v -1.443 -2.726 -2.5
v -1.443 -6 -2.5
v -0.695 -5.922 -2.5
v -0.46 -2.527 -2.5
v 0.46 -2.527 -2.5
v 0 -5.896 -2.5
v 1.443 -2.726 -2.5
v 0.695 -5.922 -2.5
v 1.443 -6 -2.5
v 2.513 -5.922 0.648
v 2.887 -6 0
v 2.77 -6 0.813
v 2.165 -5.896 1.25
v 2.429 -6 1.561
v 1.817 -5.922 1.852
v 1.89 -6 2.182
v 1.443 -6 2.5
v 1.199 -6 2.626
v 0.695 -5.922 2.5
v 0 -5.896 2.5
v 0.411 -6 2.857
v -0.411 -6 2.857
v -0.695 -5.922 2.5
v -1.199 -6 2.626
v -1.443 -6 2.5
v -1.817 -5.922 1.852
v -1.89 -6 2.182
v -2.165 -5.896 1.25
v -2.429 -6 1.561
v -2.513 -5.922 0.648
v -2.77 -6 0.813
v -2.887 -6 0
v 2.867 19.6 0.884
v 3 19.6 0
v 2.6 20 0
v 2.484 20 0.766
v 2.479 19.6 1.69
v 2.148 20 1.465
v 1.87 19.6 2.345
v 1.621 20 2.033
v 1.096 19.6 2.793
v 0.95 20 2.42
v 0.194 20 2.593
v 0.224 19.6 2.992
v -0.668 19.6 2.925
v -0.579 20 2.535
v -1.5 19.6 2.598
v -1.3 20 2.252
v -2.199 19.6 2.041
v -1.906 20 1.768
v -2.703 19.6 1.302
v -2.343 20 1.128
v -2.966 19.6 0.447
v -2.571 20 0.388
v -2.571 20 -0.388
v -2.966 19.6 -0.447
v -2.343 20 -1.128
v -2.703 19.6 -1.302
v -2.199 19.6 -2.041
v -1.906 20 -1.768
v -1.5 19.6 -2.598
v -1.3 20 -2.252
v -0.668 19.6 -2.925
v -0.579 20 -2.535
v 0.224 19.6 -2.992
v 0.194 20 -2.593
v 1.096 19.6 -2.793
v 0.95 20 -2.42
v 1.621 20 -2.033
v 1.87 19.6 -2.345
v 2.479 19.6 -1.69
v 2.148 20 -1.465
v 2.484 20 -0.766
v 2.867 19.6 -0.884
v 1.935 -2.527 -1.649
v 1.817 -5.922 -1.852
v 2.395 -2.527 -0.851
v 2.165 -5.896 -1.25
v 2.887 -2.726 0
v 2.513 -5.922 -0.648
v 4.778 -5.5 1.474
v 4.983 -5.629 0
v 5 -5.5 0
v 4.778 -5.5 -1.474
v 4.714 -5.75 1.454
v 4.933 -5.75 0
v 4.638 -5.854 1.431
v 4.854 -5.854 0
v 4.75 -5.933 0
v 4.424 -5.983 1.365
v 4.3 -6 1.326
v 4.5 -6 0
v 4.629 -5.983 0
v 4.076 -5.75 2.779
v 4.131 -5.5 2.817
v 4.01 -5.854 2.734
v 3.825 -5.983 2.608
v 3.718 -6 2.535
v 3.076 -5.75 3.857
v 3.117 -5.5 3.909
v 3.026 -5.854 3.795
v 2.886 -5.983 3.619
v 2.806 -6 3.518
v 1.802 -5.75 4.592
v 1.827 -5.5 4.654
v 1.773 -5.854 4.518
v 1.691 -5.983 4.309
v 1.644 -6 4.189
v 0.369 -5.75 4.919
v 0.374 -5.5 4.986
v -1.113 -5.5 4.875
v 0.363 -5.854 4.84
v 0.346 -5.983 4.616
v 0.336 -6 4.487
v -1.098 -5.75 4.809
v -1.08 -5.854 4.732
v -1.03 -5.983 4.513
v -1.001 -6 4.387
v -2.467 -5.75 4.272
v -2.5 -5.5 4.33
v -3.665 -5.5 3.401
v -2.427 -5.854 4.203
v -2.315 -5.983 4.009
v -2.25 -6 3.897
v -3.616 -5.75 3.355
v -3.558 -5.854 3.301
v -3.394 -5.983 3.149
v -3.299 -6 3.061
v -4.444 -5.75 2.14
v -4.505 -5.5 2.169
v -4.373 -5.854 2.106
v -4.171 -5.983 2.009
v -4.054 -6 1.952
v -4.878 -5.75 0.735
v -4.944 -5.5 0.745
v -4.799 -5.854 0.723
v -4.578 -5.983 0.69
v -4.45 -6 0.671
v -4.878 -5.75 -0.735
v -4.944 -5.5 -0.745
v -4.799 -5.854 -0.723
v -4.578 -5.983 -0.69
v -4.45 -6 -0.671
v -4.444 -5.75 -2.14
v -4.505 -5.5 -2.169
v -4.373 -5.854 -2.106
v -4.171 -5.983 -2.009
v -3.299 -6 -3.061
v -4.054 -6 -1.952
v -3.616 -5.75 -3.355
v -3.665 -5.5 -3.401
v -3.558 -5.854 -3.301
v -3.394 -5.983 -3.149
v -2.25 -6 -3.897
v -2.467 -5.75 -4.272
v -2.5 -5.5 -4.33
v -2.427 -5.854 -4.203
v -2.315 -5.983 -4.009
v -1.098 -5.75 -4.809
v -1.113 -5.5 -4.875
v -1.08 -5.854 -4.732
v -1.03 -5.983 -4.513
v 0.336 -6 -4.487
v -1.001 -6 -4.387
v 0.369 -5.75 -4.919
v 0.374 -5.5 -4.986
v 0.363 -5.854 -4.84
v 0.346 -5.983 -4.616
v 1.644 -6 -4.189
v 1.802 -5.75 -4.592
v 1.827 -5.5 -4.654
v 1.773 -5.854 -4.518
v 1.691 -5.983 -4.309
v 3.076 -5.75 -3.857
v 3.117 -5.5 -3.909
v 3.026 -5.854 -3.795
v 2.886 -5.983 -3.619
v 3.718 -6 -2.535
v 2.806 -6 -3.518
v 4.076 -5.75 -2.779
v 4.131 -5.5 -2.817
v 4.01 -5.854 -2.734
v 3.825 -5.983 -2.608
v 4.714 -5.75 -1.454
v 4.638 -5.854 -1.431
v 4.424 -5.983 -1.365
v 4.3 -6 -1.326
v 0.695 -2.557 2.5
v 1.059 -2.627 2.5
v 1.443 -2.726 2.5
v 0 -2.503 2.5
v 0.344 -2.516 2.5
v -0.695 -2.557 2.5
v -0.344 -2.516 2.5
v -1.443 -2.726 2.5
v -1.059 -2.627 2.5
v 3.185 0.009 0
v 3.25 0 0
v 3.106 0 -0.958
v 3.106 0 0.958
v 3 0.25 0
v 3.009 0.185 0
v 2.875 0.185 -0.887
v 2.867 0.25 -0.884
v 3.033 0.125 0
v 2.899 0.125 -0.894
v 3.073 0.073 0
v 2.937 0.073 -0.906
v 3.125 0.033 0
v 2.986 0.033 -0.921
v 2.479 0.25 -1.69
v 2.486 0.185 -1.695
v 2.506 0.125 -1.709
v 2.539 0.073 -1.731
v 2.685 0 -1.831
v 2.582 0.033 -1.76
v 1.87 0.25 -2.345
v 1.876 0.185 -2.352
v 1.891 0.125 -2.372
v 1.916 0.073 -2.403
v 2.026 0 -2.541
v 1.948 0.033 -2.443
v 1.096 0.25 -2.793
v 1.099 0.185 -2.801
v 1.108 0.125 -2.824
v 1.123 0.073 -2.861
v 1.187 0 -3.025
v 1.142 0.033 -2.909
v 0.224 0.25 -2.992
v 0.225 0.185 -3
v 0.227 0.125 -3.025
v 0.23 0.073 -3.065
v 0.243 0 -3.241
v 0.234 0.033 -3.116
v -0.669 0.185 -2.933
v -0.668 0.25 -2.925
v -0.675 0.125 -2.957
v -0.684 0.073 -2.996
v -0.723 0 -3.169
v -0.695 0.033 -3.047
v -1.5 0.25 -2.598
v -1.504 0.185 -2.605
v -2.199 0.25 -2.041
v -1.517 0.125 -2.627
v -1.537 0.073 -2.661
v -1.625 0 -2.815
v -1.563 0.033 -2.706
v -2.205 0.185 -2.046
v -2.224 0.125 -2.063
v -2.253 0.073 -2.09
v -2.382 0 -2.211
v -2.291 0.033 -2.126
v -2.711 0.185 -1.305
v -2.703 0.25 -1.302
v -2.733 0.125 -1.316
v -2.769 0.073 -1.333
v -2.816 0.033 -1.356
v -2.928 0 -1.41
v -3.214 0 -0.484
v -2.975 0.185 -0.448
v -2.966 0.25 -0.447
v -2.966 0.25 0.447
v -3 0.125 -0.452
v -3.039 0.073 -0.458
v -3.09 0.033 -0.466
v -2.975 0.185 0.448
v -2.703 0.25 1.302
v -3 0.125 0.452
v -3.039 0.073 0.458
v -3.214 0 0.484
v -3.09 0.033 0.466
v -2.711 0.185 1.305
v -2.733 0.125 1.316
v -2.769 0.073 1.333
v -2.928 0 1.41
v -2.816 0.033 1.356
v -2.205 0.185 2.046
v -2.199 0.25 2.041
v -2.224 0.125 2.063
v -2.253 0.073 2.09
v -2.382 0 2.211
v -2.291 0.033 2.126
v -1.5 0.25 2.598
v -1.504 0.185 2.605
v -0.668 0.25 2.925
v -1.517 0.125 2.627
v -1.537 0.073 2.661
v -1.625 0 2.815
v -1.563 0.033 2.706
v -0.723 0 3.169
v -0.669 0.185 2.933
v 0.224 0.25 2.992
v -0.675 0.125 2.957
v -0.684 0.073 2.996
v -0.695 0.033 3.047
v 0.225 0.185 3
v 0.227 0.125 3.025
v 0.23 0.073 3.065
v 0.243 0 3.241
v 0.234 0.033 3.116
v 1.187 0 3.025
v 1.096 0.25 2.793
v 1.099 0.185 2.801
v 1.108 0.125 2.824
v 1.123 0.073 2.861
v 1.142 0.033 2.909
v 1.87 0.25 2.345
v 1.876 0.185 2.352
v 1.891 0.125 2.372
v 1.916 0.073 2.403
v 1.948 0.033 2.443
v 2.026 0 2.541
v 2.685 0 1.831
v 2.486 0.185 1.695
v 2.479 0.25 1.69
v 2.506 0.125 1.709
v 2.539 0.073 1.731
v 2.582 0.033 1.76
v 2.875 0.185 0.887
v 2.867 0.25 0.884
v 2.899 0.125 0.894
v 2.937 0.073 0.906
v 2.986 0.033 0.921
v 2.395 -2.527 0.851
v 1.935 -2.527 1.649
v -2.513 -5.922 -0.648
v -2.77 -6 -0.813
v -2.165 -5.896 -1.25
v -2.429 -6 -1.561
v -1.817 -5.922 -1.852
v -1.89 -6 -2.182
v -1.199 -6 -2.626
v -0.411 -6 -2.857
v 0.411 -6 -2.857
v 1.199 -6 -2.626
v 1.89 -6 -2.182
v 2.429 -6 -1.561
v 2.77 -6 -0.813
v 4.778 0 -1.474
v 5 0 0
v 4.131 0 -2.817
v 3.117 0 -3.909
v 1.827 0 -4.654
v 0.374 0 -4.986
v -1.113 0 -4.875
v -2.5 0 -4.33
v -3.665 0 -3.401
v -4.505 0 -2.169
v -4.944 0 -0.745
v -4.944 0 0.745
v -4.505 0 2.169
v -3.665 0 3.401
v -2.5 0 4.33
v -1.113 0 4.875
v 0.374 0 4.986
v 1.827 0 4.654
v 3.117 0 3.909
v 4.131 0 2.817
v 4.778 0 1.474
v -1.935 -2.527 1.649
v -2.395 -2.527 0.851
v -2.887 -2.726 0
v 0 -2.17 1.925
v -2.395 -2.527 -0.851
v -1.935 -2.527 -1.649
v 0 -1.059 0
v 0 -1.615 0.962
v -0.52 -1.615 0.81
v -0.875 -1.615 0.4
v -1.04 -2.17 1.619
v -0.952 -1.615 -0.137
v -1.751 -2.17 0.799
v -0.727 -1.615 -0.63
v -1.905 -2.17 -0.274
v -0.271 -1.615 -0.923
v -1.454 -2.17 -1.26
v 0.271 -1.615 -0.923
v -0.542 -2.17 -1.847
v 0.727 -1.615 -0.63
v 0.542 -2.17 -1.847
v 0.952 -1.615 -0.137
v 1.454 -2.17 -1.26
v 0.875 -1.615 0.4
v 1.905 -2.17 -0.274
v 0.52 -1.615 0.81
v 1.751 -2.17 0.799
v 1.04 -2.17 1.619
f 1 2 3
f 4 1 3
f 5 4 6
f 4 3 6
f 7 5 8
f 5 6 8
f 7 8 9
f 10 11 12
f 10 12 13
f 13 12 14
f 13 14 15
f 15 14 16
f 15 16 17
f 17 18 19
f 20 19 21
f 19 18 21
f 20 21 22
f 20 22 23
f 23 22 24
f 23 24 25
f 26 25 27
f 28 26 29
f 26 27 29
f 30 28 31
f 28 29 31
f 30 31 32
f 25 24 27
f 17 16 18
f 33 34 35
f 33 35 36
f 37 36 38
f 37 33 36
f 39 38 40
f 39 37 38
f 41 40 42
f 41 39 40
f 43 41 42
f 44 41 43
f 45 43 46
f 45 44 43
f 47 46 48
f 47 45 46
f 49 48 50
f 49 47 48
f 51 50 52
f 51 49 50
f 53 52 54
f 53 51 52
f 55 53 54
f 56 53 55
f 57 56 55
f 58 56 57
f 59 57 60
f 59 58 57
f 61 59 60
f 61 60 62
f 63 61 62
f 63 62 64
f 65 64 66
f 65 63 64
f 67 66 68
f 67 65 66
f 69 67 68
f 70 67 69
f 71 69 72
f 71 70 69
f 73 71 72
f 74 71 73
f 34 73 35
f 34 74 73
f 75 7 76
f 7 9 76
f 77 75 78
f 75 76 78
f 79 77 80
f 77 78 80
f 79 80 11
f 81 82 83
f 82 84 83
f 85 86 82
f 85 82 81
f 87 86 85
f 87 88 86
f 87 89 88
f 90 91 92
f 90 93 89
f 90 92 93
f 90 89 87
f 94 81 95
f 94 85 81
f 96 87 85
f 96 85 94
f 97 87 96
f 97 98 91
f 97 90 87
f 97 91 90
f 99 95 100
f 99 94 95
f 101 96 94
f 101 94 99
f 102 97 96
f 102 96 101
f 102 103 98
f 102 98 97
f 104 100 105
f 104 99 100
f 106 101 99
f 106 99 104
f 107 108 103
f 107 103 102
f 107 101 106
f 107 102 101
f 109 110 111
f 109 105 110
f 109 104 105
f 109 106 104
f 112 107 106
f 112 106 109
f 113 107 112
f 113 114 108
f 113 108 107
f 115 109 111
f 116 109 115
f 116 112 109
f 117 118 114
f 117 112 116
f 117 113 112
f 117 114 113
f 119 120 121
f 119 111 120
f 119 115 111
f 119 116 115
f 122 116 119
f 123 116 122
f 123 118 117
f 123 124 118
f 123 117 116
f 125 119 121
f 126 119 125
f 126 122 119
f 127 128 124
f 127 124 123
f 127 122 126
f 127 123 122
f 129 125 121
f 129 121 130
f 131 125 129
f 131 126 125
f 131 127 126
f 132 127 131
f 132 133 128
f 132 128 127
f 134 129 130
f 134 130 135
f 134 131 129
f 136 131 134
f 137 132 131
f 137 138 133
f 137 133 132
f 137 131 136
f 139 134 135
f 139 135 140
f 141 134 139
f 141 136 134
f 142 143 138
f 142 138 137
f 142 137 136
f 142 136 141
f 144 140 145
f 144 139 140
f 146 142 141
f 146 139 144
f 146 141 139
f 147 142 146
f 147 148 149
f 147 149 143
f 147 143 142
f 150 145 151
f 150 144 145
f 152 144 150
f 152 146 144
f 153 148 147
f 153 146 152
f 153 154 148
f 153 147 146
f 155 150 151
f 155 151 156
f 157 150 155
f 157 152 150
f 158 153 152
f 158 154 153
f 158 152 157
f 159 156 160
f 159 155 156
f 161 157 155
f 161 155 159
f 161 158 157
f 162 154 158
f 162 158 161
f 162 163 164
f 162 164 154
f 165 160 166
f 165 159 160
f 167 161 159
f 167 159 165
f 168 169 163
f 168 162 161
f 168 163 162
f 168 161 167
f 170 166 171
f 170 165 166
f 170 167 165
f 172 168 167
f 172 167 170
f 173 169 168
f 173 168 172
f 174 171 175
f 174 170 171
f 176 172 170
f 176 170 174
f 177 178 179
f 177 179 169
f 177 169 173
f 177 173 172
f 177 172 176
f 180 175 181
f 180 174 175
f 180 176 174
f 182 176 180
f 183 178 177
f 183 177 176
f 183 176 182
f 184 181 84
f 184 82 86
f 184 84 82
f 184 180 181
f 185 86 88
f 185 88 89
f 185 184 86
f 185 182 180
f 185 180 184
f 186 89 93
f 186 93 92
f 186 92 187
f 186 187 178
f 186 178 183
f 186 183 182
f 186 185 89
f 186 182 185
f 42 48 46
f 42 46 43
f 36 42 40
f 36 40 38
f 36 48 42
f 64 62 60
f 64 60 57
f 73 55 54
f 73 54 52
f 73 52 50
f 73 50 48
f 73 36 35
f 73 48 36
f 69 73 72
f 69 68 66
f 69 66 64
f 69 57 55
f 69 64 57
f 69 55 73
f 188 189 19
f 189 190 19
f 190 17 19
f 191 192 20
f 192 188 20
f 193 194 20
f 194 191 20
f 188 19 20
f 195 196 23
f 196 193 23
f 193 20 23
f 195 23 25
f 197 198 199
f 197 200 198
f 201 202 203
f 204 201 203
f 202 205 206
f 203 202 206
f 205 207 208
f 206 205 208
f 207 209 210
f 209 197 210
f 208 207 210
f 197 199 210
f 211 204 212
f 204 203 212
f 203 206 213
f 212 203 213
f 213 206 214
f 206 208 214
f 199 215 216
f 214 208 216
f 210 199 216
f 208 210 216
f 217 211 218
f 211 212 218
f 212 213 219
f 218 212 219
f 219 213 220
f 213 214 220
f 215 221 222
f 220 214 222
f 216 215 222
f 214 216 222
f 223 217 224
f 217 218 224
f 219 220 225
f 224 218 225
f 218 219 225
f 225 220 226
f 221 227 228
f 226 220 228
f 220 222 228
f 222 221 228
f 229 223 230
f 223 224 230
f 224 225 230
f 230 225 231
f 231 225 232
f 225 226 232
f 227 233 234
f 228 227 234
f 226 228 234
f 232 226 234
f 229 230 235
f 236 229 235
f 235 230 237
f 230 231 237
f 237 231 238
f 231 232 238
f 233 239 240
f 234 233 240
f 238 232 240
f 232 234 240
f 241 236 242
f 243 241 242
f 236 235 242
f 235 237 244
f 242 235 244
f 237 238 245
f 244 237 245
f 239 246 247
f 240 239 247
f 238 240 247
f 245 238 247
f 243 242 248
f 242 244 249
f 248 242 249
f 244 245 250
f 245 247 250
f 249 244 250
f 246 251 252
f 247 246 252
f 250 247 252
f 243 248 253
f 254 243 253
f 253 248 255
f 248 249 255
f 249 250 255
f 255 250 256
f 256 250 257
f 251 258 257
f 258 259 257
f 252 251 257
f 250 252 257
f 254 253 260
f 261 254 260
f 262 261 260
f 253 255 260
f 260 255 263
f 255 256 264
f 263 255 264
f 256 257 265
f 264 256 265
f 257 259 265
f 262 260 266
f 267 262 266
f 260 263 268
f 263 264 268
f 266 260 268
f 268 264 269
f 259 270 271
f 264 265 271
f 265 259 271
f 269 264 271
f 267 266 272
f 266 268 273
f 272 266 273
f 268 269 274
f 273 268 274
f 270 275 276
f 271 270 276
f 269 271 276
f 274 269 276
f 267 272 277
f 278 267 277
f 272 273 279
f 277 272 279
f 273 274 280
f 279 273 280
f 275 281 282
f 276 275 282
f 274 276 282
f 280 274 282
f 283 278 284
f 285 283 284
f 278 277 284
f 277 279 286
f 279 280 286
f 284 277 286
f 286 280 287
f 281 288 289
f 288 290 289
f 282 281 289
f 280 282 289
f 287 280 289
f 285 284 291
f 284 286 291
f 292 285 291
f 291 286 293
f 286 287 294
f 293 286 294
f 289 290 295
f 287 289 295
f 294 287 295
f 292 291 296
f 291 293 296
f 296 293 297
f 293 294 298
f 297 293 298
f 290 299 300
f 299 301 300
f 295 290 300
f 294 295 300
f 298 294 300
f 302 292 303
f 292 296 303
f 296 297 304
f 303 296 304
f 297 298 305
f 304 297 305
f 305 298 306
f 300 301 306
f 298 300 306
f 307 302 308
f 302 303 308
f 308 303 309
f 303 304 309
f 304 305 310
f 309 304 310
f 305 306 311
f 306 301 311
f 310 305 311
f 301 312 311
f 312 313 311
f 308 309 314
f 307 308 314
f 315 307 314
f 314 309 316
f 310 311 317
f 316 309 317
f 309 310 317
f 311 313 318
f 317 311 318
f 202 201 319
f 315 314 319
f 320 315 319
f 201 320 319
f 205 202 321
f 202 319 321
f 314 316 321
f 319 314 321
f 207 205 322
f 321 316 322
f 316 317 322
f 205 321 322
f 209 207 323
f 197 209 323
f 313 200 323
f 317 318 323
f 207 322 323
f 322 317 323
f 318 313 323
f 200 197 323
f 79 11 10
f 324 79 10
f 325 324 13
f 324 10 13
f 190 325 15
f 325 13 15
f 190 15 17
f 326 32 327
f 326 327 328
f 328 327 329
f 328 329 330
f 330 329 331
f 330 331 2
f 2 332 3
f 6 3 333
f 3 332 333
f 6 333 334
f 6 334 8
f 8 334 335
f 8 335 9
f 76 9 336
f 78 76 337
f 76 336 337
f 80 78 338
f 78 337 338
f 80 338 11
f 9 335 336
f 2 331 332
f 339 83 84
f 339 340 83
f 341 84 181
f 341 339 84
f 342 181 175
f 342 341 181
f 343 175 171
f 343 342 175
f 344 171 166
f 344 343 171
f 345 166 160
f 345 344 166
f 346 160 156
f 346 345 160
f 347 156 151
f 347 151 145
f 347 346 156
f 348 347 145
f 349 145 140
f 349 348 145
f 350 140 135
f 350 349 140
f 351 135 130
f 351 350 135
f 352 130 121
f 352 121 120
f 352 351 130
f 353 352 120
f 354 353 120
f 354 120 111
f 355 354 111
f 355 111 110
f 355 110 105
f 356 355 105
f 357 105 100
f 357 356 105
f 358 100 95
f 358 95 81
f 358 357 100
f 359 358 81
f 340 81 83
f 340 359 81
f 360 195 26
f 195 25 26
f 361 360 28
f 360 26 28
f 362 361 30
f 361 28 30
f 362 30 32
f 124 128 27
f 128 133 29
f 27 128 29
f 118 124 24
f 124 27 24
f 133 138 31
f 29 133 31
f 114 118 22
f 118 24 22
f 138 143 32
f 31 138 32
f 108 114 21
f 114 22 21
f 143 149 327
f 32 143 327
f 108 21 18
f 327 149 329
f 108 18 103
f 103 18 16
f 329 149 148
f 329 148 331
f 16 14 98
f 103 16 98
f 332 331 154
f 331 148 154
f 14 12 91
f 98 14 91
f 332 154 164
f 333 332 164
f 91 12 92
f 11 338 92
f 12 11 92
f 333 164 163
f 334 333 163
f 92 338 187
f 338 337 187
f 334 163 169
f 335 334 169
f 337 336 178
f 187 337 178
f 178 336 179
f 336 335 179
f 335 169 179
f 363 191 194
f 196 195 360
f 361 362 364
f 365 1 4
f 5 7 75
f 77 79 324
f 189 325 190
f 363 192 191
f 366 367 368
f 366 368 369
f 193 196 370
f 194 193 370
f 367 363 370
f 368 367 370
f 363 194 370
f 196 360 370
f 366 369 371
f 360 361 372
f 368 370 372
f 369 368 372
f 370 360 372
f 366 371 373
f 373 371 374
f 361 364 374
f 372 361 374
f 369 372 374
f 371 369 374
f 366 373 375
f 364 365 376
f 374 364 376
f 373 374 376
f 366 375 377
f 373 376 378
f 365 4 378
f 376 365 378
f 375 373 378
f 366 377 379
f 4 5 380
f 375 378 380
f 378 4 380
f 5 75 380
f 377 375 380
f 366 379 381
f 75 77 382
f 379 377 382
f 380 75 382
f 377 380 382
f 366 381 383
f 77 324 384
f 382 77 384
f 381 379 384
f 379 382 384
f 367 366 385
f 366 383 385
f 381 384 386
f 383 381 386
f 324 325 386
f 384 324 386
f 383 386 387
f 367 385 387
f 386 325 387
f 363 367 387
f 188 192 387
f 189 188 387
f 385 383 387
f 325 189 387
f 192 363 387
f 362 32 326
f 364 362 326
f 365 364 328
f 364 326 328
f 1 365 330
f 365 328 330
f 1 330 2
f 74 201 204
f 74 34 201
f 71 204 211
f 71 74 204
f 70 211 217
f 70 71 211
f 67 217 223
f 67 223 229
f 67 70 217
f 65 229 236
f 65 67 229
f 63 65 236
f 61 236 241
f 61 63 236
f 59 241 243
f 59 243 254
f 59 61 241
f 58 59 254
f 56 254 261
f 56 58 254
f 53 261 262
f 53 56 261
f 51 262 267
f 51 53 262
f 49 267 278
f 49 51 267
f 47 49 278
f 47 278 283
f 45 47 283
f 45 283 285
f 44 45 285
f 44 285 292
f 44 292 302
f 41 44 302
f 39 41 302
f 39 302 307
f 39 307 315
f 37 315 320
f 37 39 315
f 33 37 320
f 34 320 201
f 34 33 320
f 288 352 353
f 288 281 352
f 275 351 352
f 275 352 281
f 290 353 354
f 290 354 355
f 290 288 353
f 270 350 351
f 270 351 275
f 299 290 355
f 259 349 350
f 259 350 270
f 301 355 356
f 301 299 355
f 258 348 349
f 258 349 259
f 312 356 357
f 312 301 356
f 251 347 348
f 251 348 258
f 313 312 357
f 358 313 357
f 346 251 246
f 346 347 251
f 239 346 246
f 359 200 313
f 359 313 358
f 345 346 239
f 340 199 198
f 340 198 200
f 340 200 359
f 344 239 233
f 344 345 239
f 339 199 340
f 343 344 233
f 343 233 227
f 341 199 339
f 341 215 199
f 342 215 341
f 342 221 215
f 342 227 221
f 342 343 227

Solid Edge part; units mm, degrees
sketch "Sketch1" plane through (0, 0, 0) normal (0, 0, 1) x (1, 0, 0)
  line L0 (3, 0) -> (3, 20)
  line L1 (0, 20) -> (3, 20)
  line L2 (0, 0) -> (0, 20)
  line L3 (0, 0) -> (0, -6)
  line L4 (0, -6) -> (5, -6)
  line L5 (5, -6) -> (5, 0)
  line L6 (5, 0) -> (3, 0)
revolve "RevolvedProtrusion1" add sketch "Sketch1" angle 360 about axis through (0, 0, 0) along (0, 1, 0)
sketch "Sketch2" plane through (0, 0, 0) normal (1, 0, 0) x (0, 1, 0)
  line L0 (-6, 3.3615) -> (-3, 3.3615)
  line L1 (-1.0592, 0) -> (-3, 3.3615)
  line L2 (-6, 0) -> (-1.0592, 0)
  line L3 (-6, 0) -> (-6, 3.3615)
revolve "RevolvedCutout1" cut sketch "Sketch2" angle 360 about axis through (0, -4.5, 0) along (0, 1, 0)
sketch "Sketch3" plane through (0, -6, 0) normal (0, -1, 0) x (0, 0, 1)
  circle A0 centre (0, 0) radius 3.3615
  line L0 (-2.5, -1.4434) -> (0, -2.8868)
  line L1 (0, -2.8868) -> (2.5, -1.4434)
  line L2 (2.5, -1.4434) -> (2.5, 1.4434)
  line L3 (2.5, 1.4434) -> (0, 2.8868)
  line L4 (0, 2.8868) -> (-2.5, 1.4434)
  line L5 (-2.5, 1.4434) -> (-2.5, -1.4434)
  dimension "D1" = 5
extrude "Protrusion1" add sketch "Sketch3" against normal up to next
sketch "Sketch4" plane through (0, 0, 0) normal (0, 0, 1) x (1, 0, 0)
  line L0 (-2.8868, -6) -> (0, -6)
  line L1 (0, -6) -> (0, -5.2265)
  line L2 (0, -5.2265) -> (-2.8868, -6)
revolve "RevolvedCutout2" cut sketch "Sketch4" angle 360 about axis through (0, -4.5, 0) along (0, 1, 0)
fillet "Round1" radius 0.25 1 edges at (0, 0, -3)
fillet "Round2" radius 0.5 1 edges at (0, -6, -5)
chamfer "倒斜角_2" distance 0.4 angle 45 1 edges at (0, 20, -3)
cosmetic_thread "螺纹_3" size "M6" thread depth 16
